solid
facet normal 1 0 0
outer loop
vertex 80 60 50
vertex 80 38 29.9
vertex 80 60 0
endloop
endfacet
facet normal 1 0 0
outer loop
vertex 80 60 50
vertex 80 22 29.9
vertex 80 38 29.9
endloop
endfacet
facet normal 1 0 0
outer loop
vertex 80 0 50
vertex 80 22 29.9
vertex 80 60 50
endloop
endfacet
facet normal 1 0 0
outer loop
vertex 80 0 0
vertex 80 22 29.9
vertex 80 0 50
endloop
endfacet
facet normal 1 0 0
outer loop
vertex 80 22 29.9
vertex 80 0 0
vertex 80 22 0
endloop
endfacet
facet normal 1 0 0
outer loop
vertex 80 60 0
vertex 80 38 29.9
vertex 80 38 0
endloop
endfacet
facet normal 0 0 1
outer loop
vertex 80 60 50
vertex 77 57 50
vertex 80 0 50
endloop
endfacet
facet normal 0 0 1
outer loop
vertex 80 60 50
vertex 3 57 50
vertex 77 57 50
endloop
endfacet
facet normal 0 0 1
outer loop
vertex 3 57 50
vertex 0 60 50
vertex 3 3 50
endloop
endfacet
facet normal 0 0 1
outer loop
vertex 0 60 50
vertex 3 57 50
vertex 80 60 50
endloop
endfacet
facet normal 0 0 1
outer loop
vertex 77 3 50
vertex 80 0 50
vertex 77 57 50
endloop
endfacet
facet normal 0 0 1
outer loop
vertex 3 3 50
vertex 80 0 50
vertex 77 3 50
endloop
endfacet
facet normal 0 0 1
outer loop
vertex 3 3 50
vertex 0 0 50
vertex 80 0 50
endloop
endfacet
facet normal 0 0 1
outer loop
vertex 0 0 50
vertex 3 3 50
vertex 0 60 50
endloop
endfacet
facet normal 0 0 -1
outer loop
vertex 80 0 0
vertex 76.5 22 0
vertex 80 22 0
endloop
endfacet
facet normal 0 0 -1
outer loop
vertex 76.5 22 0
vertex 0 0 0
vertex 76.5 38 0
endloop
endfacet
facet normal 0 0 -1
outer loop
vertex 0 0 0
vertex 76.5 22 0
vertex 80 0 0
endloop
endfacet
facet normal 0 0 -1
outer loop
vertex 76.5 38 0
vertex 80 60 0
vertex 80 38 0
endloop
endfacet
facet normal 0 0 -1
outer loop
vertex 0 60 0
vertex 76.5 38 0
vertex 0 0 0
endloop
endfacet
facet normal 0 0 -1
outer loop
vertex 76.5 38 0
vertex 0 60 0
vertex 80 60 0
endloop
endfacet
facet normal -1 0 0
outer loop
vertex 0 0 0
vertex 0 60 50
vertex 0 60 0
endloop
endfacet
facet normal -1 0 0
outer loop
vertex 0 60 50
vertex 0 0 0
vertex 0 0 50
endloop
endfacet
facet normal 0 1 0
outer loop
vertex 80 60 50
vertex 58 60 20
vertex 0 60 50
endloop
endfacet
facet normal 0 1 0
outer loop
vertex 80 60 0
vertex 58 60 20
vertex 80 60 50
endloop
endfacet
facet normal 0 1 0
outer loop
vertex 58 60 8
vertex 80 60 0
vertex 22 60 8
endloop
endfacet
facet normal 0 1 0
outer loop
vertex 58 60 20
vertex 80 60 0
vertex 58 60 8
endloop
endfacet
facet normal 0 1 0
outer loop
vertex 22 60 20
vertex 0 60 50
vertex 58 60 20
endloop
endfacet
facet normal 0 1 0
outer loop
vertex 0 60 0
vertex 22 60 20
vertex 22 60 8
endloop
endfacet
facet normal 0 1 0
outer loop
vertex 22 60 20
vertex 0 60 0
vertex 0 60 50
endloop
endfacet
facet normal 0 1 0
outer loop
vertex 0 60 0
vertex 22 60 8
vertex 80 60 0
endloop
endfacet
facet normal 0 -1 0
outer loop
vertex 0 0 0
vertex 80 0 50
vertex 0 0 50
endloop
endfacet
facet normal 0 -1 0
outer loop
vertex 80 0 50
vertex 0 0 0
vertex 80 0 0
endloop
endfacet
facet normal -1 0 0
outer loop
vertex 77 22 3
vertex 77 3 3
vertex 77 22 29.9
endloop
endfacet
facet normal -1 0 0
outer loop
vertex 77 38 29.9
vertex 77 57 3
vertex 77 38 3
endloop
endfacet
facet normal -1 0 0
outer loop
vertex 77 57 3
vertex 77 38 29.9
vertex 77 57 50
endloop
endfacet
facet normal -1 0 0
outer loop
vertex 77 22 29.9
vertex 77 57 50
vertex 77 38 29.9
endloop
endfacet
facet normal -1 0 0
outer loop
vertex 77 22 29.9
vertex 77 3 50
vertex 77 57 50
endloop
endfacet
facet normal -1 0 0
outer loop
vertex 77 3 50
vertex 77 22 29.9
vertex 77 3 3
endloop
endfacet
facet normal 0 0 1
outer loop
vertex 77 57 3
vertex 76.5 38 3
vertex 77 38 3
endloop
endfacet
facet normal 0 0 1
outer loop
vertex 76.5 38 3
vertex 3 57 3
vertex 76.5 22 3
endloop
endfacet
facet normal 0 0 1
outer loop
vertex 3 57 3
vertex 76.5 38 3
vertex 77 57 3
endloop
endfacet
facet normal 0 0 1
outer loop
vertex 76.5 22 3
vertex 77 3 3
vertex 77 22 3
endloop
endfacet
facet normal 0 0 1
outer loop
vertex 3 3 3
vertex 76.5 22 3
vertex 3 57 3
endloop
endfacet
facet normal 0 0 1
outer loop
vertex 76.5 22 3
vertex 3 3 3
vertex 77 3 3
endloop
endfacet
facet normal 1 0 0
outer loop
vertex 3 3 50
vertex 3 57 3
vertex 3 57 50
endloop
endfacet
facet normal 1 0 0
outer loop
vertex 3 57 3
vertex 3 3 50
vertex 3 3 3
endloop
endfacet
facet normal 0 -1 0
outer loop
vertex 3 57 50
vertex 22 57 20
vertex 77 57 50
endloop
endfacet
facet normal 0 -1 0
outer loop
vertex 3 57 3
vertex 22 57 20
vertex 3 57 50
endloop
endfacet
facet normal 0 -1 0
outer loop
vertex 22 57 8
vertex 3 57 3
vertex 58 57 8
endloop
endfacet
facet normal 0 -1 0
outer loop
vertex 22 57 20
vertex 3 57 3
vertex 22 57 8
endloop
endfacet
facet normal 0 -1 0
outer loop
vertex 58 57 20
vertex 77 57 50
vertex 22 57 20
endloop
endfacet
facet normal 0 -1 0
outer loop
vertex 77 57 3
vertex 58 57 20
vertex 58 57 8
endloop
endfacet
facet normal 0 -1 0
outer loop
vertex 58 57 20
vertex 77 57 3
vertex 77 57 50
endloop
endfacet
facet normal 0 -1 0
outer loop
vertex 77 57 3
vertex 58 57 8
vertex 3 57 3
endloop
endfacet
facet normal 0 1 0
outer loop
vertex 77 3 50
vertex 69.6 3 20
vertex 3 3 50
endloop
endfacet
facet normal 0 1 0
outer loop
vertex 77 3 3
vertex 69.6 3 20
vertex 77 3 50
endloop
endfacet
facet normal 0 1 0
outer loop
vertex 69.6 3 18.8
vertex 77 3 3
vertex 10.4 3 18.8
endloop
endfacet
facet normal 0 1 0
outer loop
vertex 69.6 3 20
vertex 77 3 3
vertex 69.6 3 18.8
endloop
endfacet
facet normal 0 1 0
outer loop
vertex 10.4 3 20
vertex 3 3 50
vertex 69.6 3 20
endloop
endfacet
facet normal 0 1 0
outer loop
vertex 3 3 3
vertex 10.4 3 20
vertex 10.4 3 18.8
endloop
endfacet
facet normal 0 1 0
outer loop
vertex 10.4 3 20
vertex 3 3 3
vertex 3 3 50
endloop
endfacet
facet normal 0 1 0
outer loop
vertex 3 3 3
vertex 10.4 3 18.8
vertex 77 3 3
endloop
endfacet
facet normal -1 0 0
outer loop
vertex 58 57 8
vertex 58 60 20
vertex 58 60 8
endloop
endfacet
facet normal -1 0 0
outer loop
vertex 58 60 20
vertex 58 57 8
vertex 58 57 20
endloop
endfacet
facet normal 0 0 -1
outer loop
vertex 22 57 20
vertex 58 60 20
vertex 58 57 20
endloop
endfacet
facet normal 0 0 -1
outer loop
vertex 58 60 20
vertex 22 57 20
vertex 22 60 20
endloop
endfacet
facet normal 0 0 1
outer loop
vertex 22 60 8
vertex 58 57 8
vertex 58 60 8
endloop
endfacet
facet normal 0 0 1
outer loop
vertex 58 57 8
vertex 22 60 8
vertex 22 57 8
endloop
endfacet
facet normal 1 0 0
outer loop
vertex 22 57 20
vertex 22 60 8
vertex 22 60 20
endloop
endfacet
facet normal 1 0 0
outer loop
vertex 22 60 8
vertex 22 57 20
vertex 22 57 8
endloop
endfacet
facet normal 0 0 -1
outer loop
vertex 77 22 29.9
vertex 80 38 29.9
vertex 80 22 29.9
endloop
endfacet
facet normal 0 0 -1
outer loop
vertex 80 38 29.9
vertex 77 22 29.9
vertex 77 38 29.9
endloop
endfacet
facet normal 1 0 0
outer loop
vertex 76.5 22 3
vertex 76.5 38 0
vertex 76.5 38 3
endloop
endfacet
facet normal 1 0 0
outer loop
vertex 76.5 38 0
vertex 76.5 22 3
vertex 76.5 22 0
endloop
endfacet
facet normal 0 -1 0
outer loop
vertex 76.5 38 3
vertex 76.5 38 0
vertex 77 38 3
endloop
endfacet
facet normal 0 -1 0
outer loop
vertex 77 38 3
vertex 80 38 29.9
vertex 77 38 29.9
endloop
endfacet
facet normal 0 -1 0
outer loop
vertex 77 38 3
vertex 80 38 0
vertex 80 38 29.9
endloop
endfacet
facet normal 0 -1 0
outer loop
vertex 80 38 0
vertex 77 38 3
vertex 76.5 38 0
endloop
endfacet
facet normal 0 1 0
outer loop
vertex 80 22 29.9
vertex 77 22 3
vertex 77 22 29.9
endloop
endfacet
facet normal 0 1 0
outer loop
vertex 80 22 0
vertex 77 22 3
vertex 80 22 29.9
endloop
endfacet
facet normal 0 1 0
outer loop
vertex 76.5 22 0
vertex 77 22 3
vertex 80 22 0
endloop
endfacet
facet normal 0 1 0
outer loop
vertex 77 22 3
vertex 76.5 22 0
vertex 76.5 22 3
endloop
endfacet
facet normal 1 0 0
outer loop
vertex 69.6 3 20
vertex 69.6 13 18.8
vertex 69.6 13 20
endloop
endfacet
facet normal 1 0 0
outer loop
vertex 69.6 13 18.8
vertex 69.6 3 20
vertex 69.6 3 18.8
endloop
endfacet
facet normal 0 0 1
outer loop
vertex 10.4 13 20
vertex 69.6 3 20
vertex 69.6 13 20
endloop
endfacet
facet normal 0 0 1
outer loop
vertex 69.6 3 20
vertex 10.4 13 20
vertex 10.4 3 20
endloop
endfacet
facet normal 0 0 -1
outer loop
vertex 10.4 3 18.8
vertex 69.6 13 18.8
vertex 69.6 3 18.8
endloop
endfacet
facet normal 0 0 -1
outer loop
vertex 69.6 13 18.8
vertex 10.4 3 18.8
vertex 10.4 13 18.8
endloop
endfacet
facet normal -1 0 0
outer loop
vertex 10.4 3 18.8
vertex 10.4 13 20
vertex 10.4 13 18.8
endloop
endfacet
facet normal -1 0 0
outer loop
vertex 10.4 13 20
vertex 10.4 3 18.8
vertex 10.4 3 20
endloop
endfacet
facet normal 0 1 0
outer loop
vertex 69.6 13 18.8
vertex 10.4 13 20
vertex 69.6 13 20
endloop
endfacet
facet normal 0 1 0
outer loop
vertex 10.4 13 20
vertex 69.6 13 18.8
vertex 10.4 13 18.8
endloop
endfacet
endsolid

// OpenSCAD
// === Parameters ===

// Outer box dimensions
box_width  = 80;   // X dimension
box_depth  = 60;   // Y dimension
box_height = 50;   // Z dimension
wall_thick = 3;    // Wall thickness

// Rim (top edge) stays full height; interior is hollowed
interior_depth = box_height - wall_thick;  // hollow depth from top

// Side recess (centered horizontal slot on front face, +Y side)
recess_width   = 36;   // X span of the recess
recess_height  = 12;   // Z span of the recess
recess_depth   = wall_thick + 1; // cut fully through wall
recess_z_off   = 8;    // distance from bottom to recess lower edge

// Adjacent-side vertical opening (right face, +X side)
vert_open_width  = 16;  // Y span of the vertical opening
vert_open_height = 30;  // Z span, rising from bottom
vert_open_depth  = wall_thick + 1; // through the wall

// Internal ledge / shelf rib (along back wall, -Y inside face)
ledge_thickness = 1.2;  // Z thickness of the shelf
ledge_width_pct = 0.8;  // fraction of interior X span
ledge_protrusion = 10;  // how far the ledge sticks out from back wall (Y)
ledge_z          = 20;  // height of ledge top surface from bottom

// Resolution
$fn = 40;

// === Helper Modules ===

// Basic hollow box with open top
module hollow_box(w, d, h, wt) {
    difference() {
        // Outer shell
        cube([w, d, h]);
        // Interior cavity (open top)
        translate([wt, wt, wt])
            cube([w - 2*wt, d - 2*wt, h]);  // extends above top to open it
    }
}

// Centered rectangular recess on the front face (+Y wall)
module front_recess(bw, bd, wt, rw, rh, rd, rz) {
    translate([bw/2 - rw/2, bd - wt - 0.5, rz])
        cube([rw, rd, rh]);
}

// Vertical through opening on the right face (+X wall)
module right_vert_opening(bw, bd, wt, ow, oh, od) {
    translate([bw - wt - 0.5, bd/2 - ow/2, -0.1])
        cube([od, ow, oh]);
}

// Internal ledge along back wall (-Y inside face)
module internal_ledge(bw, wt, lt, lw_pct, lp, lz) {
    interior_x = bw - 2*wt;
    ledge_w = interior_x * lw_pct;
    x_offset = wt + (interior_x - ledge_w) / 2;  // centered along X
    translate([x_offset, wt, lz - lt])
        cube([ledge_w, lp, lt]);
}

// === Main Assembly ===

union() {
    difference() {
        // Step 1: Create the hollow open-top box with rim
        hollow_box(box_width, box_depth, box_height, wall_thick);

        // Step 2: Horizontal rectangular recess on front face (centered)
        front_recess(box_width, box_depth, wall_thick,
                     recess_width, recess_height, recess_depth, recess_z_off);

        // Step 3: Vertical through opening on right face, rising from bottom
        right_vert_opening(box_width, box_depth, wall_thick,
                           vert_open_width, vert_open_height, vert_open_depth);
    }

    // Step 4: Add the thin internal shelf/rib along the back wall
    internal_ledge(box_width, wall_thick,
                   ledge_thickness, ledge_width_pct, ledge_protrusion, ledge_z);
}
